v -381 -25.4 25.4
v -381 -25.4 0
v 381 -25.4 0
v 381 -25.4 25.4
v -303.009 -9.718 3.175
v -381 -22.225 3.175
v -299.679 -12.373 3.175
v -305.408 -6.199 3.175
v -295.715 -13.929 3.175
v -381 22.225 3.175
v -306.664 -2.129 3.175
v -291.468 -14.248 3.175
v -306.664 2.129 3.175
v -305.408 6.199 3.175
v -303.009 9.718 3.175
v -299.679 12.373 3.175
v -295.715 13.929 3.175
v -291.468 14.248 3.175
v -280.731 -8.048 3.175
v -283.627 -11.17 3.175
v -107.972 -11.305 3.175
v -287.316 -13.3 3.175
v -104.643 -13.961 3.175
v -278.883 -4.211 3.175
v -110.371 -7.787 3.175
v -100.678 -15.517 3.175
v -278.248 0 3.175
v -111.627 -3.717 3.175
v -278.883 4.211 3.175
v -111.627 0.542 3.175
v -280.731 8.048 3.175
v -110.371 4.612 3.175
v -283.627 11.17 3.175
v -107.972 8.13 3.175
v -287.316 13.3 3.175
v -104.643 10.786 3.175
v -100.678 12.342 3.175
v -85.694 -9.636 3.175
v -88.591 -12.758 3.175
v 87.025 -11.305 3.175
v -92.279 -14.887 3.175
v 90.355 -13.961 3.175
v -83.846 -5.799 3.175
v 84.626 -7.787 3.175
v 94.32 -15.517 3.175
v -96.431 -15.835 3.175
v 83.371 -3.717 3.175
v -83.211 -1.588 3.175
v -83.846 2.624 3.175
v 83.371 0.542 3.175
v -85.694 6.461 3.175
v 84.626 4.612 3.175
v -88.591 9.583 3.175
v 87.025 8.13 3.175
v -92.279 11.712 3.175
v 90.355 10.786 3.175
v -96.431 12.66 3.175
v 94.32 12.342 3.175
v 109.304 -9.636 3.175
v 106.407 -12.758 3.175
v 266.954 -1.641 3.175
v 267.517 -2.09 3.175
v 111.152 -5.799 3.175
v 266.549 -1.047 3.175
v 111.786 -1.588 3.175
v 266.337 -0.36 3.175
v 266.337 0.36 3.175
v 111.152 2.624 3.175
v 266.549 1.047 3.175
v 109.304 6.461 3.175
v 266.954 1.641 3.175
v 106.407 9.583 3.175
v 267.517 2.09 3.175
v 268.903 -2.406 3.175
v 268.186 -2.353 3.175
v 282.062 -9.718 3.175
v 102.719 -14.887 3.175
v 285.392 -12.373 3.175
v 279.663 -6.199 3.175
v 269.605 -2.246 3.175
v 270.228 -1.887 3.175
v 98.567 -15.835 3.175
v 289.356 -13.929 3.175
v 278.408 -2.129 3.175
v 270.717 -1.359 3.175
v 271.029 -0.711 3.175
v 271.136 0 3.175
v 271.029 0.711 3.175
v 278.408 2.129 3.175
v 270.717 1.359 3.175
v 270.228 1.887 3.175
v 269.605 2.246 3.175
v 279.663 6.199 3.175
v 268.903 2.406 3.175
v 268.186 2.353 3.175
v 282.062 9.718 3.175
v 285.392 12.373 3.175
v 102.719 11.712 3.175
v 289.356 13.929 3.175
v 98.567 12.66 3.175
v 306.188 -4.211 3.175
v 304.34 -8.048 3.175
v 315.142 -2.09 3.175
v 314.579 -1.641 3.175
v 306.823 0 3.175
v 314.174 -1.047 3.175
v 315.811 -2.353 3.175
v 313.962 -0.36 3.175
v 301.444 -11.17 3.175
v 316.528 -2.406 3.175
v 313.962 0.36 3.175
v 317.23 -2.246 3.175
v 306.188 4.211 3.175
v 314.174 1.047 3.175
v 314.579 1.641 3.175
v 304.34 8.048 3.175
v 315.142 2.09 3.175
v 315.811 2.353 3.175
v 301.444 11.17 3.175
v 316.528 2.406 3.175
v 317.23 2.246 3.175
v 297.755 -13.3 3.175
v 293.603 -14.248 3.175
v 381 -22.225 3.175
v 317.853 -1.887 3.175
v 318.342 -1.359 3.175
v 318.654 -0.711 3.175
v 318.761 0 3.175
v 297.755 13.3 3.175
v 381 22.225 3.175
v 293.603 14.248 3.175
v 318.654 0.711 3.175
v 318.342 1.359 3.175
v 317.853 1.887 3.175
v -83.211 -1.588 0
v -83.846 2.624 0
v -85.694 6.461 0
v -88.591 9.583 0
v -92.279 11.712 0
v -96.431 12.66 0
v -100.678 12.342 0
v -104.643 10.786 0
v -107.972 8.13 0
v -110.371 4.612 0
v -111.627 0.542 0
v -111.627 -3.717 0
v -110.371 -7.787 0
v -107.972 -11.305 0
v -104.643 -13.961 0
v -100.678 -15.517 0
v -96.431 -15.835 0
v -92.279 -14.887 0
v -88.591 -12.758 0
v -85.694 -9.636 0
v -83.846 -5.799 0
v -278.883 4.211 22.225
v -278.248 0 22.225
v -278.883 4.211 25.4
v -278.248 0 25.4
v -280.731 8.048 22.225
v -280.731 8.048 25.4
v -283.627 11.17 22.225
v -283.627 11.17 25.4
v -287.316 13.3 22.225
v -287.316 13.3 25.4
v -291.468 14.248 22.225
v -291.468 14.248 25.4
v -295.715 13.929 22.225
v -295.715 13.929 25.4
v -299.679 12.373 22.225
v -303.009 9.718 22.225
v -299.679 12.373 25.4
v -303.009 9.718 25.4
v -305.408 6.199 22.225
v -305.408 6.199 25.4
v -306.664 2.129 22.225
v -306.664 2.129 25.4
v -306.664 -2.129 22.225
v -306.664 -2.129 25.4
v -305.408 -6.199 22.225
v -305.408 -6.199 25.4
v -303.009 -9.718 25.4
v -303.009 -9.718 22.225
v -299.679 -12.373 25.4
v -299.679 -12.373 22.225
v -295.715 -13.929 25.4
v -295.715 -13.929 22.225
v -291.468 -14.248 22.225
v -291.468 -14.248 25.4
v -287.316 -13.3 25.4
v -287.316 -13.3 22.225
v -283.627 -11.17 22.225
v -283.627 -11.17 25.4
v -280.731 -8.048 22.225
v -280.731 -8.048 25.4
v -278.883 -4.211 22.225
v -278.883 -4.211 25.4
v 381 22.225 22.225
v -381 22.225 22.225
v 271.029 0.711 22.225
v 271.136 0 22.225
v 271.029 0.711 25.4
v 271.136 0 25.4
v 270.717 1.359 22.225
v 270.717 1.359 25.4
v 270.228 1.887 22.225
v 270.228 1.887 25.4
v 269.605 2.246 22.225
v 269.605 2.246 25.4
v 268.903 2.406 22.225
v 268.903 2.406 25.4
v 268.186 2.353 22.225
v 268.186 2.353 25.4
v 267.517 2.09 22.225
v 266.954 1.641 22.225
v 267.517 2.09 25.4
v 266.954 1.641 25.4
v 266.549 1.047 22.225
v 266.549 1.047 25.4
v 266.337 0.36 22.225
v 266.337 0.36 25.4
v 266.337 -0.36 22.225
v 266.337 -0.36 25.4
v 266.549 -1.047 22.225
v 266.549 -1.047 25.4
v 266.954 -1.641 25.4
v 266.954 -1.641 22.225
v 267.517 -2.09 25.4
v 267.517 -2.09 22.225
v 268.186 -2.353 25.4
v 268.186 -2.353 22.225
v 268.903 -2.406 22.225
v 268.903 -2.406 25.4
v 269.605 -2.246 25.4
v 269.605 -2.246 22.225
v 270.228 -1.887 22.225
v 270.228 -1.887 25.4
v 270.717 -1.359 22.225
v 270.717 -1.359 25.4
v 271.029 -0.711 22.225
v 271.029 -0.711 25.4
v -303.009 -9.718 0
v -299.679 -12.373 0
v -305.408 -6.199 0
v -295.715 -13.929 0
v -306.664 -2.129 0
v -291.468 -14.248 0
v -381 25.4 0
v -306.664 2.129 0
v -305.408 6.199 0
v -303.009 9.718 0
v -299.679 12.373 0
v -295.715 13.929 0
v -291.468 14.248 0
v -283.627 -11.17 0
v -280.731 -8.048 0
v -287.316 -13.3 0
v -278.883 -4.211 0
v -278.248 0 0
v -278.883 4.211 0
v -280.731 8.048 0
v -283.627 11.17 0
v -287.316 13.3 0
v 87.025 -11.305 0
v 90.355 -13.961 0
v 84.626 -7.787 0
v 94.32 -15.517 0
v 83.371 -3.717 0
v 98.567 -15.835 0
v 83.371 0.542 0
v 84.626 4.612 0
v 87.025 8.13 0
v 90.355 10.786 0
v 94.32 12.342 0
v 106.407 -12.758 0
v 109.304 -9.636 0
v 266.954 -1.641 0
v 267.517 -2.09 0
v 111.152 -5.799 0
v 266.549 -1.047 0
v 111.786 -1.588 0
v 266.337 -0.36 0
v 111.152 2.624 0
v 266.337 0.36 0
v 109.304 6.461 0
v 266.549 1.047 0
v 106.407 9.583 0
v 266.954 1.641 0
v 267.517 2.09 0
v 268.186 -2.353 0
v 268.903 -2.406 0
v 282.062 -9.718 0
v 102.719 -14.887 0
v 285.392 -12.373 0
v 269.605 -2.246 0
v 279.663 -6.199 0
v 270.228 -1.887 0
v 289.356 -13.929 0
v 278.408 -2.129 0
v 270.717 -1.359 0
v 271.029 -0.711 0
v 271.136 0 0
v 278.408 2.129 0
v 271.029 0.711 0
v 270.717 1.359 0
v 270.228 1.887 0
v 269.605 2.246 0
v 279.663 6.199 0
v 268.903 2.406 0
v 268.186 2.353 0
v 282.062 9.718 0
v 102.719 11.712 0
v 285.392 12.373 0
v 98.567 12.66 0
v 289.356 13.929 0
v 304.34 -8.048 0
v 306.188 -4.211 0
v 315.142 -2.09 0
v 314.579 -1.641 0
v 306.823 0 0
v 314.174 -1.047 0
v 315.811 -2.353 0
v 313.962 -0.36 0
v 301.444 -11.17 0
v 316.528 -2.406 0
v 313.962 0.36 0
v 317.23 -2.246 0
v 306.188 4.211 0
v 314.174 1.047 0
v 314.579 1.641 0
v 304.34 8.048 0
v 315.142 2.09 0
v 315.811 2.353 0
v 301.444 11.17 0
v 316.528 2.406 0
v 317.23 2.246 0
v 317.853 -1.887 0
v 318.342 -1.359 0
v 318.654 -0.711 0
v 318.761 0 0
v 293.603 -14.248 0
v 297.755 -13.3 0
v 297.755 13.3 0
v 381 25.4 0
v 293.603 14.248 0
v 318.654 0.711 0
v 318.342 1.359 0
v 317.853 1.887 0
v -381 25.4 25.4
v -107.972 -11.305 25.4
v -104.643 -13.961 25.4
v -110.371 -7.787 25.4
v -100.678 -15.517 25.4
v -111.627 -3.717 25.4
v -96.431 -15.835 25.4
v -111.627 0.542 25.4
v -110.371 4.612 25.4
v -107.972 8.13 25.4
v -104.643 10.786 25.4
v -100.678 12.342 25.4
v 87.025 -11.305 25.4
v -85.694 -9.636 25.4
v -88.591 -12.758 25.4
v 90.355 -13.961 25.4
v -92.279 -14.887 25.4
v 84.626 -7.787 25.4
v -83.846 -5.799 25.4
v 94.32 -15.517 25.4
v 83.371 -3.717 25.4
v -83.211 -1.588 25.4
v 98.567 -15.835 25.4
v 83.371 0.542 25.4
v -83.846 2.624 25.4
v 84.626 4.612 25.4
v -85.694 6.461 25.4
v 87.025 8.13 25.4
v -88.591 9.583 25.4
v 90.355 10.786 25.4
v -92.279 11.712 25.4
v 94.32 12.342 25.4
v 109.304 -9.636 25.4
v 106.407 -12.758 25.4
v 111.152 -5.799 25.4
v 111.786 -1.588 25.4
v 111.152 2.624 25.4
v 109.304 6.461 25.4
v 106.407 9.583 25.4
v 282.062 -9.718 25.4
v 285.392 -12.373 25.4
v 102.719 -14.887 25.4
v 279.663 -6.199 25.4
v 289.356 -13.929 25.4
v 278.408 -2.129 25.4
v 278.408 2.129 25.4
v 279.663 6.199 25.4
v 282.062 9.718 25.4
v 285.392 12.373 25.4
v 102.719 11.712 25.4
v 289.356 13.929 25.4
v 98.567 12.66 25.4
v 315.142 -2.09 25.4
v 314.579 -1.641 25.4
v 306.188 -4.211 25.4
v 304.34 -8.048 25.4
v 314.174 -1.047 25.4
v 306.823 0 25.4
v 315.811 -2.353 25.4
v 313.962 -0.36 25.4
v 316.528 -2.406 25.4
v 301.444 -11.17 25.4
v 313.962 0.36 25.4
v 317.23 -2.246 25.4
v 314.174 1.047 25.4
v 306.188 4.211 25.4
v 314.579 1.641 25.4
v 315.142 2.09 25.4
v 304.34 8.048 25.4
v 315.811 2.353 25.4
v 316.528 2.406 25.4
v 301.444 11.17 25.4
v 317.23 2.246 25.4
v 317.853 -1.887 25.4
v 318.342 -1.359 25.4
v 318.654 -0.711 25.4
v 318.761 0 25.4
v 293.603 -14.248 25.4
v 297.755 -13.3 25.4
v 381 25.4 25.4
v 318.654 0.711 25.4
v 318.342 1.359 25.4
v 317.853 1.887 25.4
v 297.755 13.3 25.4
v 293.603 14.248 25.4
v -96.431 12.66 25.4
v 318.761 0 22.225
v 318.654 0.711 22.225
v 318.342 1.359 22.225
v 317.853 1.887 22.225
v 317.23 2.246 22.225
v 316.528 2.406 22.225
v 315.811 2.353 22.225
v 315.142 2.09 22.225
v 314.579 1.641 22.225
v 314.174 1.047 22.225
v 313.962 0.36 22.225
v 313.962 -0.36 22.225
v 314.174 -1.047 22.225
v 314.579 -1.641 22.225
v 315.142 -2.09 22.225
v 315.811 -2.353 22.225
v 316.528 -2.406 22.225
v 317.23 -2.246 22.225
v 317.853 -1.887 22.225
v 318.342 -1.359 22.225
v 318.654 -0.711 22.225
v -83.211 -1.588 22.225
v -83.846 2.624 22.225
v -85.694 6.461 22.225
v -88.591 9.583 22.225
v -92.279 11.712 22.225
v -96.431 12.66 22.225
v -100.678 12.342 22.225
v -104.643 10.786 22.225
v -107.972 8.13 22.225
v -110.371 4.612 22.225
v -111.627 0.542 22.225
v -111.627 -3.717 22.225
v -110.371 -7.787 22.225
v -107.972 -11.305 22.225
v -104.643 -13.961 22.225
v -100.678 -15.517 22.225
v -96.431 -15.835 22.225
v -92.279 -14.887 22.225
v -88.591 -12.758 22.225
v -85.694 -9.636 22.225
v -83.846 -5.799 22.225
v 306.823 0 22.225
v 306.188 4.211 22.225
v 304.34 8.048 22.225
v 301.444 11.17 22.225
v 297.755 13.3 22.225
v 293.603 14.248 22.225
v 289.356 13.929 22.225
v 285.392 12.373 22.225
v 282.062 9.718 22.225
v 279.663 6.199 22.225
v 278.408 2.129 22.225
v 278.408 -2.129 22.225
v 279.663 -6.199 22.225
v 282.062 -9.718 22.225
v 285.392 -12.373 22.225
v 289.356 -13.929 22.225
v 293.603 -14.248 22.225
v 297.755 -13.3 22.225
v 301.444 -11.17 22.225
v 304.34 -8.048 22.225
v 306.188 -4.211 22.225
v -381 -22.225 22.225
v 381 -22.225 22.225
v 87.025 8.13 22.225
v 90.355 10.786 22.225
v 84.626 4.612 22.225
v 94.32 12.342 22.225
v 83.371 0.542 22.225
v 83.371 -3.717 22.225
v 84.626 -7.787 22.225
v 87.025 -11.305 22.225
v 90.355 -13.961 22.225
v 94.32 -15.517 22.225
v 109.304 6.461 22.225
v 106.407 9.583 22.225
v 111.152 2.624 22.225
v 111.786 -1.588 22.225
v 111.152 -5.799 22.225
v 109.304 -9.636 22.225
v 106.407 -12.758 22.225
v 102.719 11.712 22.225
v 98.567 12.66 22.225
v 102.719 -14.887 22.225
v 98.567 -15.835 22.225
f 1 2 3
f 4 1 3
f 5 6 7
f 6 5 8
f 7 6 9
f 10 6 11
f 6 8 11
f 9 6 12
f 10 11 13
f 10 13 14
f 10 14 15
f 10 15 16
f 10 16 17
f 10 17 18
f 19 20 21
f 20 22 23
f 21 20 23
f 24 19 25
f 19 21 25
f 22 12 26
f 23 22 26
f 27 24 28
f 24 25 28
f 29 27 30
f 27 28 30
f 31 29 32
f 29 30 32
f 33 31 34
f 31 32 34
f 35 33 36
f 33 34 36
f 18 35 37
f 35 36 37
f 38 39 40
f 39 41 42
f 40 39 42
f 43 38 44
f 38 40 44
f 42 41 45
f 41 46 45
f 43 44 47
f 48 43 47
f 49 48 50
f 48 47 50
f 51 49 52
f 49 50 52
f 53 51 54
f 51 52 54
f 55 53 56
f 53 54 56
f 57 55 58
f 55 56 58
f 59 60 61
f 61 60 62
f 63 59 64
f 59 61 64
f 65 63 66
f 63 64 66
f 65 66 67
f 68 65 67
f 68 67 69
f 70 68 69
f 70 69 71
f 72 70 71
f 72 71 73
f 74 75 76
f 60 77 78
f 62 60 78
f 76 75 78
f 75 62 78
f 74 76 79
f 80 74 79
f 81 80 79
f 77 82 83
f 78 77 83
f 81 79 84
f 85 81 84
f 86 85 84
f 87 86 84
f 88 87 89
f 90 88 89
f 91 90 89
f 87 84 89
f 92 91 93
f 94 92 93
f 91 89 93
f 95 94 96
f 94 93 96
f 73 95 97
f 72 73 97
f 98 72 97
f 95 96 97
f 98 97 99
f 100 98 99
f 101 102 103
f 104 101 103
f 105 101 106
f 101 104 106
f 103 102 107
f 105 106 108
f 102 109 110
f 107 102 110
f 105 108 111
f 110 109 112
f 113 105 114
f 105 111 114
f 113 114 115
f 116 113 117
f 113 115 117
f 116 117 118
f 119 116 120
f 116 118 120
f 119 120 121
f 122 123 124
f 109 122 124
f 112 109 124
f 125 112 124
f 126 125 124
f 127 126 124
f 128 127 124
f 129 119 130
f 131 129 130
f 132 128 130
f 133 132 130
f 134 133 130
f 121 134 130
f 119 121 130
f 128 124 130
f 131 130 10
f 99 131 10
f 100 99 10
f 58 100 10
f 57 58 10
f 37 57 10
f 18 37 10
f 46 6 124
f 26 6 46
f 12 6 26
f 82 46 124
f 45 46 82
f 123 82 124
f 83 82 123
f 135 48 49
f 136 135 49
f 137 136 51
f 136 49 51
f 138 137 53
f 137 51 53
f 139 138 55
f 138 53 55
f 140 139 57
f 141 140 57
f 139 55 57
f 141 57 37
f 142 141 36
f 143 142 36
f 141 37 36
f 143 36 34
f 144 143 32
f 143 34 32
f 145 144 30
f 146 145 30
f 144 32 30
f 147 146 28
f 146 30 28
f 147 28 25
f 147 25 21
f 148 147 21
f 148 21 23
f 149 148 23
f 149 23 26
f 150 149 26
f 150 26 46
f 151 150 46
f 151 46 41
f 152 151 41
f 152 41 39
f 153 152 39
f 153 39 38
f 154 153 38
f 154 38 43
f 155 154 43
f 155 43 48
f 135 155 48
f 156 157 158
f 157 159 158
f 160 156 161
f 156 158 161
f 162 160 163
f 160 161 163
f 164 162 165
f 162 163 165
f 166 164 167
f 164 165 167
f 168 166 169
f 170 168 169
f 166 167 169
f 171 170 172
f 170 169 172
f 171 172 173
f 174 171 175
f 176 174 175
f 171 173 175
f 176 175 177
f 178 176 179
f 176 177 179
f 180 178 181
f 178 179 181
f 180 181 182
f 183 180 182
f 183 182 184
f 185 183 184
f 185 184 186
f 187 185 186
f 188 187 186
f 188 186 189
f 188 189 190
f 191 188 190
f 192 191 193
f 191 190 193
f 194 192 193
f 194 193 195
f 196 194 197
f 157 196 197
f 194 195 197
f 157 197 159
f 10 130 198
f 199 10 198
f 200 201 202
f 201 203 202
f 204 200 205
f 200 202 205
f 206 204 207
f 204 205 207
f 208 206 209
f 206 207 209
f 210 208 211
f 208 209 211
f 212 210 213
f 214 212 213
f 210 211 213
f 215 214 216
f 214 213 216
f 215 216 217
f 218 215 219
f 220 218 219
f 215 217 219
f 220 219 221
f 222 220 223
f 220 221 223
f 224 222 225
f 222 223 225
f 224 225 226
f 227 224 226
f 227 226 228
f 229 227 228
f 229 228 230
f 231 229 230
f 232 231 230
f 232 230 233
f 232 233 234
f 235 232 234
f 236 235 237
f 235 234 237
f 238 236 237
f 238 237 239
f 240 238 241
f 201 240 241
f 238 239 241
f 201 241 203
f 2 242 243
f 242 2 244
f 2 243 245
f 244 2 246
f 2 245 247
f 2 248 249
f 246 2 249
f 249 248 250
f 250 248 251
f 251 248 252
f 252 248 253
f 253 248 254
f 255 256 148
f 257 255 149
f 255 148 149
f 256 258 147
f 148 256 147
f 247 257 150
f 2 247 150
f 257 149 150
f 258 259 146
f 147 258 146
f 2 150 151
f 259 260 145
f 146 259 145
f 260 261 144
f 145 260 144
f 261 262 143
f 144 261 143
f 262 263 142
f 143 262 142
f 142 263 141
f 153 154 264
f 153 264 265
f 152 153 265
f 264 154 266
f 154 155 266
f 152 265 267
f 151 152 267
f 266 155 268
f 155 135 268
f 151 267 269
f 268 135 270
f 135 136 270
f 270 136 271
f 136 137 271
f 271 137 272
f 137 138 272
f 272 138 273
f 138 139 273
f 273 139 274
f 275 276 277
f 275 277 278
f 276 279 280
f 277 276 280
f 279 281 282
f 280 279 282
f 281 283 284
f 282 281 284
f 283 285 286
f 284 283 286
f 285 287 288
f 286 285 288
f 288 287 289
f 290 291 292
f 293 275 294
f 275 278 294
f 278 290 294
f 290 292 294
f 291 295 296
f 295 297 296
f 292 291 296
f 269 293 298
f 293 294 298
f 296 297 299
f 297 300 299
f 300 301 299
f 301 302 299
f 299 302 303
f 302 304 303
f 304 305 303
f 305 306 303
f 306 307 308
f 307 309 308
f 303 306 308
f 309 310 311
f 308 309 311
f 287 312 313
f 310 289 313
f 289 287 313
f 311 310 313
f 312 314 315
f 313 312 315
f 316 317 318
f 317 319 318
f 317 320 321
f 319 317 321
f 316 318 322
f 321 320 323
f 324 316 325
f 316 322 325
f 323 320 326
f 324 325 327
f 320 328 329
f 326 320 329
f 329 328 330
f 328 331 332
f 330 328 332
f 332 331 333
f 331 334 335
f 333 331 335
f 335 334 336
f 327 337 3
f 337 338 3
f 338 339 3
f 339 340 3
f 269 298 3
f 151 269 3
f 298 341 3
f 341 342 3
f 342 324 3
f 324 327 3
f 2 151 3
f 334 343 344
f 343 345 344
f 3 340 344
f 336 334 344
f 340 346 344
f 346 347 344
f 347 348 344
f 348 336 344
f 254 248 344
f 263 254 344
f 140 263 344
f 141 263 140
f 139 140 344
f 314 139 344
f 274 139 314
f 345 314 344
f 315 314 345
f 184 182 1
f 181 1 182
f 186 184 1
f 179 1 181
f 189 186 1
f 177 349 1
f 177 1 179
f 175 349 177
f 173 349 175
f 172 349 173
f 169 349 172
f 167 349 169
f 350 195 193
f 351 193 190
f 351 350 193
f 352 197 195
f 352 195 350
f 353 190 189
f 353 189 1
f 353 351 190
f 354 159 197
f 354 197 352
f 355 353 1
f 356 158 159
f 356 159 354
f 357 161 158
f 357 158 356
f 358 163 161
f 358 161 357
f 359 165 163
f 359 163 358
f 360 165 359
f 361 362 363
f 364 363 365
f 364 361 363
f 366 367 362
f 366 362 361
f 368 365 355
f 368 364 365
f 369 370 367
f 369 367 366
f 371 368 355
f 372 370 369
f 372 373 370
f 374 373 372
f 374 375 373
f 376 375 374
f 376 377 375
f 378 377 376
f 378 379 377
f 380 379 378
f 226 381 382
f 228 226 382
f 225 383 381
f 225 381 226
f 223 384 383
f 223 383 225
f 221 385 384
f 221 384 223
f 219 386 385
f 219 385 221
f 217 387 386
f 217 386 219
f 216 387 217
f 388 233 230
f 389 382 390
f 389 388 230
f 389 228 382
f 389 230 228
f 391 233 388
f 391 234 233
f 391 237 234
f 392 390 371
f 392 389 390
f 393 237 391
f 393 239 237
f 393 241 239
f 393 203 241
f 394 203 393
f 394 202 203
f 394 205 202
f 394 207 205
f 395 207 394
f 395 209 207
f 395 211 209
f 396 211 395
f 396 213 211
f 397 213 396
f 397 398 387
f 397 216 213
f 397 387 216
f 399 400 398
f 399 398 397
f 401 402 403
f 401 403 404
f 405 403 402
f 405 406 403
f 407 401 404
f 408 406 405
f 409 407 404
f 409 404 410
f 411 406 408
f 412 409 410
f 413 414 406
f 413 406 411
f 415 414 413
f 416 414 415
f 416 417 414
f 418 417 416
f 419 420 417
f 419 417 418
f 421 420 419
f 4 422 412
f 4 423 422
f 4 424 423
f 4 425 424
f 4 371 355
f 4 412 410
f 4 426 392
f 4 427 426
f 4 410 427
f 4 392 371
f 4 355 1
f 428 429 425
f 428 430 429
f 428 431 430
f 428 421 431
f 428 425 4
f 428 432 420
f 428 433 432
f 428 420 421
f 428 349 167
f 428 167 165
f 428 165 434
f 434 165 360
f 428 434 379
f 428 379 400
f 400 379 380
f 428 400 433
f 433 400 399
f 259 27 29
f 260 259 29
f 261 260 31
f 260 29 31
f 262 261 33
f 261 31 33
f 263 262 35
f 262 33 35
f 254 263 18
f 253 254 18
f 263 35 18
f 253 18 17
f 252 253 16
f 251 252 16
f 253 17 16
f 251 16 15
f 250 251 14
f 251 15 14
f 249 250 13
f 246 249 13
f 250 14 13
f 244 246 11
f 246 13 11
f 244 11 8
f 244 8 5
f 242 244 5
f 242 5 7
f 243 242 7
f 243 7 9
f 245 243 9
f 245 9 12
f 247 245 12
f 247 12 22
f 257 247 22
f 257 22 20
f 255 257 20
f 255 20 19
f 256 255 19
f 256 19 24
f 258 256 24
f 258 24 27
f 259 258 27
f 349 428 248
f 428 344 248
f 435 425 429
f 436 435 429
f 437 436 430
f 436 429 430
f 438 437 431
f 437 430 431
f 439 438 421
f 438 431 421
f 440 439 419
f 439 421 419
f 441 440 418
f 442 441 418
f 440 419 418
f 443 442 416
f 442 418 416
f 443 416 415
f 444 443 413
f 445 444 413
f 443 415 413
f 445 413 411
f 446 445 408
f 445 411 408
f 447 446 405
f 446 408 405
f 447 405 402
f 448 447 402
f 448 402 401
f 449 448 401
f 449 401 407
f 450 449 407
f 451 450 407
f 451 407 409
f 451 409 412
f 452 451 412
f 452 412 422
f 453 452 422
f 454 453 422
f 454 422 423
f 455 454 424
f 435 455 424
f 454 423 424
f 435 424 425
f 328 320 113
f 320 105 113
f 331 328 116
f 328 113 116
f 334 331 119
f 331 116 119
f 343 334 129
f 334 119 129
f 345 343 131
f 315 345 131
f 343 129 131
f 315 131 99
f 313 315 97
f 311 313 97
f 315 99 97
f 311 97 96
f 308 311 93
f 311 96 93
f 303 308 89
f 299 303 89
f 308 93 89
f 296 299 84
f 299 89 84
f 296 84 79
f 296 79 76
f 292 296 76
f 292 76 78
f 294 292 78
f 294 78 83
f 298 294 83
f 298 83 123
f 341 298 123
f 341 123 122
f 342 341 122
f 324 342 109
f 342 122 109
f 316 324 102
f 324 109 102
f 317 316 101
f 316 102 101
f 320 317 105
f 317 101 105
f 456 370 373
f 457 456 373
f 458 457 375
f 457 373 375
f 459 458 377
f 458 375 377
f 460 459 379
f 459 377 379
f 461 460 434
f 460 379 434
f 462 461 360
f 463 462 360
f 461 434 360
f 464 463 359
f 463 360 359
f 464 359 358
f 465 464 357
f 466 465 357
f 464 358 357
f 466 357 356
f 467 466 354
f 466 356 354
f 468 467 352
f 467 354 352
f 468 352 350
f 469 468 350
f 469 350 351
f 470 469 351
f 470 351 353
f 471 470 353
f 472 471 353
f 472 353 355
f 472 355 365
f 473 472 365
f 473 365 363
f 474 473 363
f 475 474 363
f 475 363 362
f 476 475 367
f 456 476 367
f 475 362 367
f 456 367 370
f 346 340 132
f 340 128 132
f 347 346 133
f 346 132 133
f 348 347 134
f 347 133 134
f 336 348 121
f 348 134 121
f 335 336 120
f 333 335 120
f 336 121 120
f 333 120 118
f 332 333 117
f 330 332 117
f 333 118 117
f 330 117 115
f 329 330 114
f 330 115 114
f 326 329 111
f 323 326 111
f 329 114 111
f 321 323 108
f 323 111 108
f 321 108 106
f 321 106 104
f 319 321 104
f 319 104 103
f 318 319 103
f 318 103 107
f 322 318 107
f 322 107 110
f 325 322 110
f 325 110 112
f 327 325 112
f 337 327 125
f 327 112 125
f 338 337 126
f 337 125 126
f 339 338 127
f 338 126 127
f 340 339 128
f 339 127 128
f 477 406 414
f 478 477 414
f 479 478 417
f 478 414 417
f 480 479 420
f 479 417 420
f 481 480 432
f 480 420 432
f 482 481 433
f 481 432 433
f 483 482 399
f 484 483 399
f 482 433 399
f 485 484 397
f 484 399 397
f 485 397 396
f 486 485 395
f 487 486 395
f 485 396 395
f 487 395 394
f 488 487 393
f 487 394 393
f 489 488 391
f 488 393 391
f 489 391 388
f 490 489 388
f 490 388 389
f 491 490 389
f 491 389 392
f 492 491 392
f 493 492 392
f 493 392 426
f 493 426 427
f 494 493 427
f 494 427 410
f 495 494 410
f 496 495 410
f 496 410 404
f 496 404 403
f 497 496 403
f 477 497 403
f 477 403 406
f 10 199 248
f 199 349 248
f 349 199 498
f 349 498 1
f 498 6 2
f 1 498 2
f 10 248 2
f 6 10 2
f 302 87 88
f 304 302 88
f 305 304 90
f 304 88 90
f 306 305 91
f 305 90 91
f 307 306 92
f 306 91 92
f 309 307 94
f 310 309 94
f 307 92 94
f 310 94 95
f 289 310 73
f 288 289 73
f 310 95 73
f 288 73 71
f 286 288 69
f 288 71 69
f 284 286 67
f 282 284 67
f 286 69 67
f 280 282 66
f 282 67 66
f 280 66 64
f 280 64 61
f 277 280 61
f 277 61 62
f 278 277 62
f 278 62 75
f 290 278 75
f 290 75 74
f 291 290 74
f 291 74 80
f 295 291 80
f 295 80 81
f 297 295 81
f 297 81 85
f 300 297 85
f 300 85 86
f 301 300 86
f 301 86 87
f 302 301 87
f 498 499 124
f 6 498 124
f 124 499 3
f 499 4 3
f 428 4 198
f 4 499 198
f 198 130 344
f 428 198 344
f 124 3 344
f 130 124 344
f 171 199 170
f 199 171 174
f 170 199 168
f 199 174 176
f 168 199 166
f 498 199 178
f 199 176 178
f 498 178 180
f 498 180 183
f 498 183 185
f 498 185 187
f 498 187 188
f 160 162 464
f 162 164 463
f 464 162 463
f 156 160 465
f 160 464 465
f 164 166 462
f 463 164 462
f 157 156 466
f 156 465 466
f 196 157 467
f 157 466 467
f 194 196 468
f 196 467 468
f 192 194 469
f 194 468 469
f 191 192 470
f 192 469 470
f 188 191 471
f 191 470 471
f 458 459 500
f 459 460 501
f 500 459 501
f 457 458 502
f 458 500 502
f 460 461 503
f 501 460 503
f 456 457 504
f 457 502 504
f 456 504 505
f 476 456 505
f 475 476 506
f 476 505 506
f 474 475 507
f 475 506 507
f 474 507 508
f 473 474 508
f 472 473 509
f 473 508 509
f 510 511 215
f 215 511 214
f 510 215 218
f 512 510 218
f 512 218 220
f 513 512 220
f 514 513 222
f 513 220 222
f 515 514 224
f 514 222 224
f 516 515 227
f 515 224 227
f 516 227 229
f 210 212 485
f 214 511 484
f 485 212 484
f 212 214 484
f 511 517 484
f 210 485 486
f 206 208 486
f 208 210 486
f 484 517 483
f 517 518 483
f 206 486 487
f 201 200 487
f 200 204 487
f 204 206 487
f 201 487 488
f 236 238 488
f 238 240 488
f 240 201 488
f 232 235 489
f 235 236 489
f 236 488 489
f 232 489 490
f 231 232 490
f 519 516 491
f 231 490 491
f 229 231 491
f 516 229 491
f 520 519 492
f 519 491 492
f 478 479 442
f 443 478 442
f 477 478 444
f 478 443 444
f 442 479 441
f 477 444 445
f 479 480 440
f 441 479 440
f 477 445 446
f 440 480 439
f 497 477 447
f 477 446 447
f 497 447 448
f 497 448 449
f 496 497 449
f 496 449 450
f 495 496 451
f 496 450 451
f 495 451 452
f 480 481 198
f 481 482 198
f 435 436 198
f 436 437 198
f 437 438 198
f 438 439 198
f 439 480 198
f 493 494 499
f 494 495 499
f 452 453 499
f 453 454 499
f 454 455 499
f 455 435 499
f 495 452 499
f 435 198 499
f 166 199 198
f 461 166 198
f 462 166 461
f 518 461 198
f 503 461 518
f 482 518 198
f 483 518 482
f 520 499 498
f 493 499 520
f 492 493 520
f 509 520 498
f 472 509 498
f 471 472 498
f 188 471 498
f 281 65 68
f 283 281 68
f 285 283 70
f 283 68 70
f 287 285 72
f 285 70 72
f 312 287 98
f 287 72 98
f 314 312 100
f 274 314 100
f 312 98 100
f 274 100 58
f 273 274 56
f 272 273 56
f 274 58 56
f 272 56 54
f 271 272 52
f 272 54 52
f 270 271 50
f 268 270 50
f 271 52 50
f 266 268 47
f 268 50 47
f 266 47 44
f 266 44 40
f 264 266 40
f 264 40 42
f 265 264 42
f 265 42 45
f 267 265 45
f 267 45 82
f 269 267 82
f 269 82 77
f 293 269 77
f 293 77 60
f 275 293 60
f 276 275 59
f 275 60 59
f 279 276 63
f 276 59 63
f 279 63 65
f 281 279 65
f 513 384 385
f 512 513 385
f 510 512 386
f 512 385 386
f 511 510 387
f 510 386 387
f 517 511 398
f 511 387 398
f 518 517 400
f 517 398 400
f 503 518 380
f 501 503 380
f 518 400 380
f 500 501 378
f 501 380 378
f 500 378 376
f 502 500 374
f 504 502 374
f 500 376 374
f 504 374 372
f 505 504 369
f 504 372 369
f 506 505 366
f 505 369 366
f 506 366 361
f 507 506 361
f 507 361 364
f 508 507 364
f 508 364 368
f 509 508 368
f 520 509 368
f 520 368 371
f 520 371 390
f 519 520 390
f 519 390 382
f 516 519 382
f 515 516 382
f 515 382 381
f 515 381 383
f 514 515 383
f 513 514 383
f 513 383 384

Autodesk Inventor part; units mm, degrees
ref_plane "YZ Plane" through (0, 0, 0) normal (1, 0, 0) x (0, 1, 0)
ref_plane "XZ Plane" through (0, 0, 0) normal (0, 1, 0) x (-1, 0, 0)
ref_plane "XY Plane" through (0, 0, 0) normal (0, 0, 1) x (1, 0, 0)
sketch "Sketch1" plane through (0, 0, 0) normal (0, 0, 1) x (1, 0, 0)
  line L0 (-381, -25.4) -> (381, -25.4)
  line L1 (381, -25.4) -> (381, 25.4)
  line L2 (381, 25.4) -> (-381, 25.4)
  line L3 (-381, 25.4) -> (-381, -25.4)
  line L4 (-381, -25.4) -> (381, 25.4) construction
  line L5 (381, -25.4) -> (-381, 25.4) construction
  point P0 (0, 0)
  dimension "d0" = 762
  dimension "d1" = 50.8
extrude "Extrusion1" add sketch "Sketch1" along normal blind 25.4
sketch "Sketch2" plane through (381, -25.4, 0) normal (1, 0, 0) x (0, 0, -1)
  line L0 (-25.4, 0) -> (-25.4, 50.8) projected
  line L1 (-25.4, 50.8) -> (0, 50.8)
  line L2 (0, 50.8) -> (0, 0)
  line L3 (0, 0) -> (-25.4, 0)
  line L4 (-25.4, 0) -> (-25.4, 50.8)
  line L5 (-3.175, 47.625) -> (-22.225, 47.625)
  line L6 (-22.225, 47.625) -> (-22.225, 3.175)
  line L7 (-22.225, 3.175) -> (-3.175, 3.175)
  line L8 (-3.175, 3.175) -> (-3.175, 47.625)
  point P0 (0, 25.4)
  dimension "d4" = 3.175
extrude "Extrusion2" cut sketch "Sketch2" against normal blind 762 contours L8 L7 L6 L5
sketch "Sketch3" plane through (0, 0, 25.4) normal (0, 0, 1) x (1, 0, 0)
  circle A0 centre (-292.5356, 0) radius 14.2875
  circle A1 centre (292.5356, 0) radius 14.2875
  line L0 (381, 25.4) -> (-381, 25.4) projected
  line L1 (0, 25.4) -> (0, -25.4)
  line L2 (-381, -25.4) -> (381, -25.4) projected
  dimension "d40" = 292.5356
  dimension "d41" = 292.5356
extrude "Extrusion3" cut sketch "Sketch3" against normal blind 25.4
sketch "Sketch5" plane through (0, 0, 25.4) normal (0, 0, 1) x (1, 0, 0)
  point P0 (0, 0)
sketch "Sketch6" plane through (0, 0, 25.4) normal (0, 0, 1) x (1, 0, 0)
  circle A0 centre (97.4989, -1.5875) radius 14.2875
  circle A1 centre (-97.4989, -1.5875) radius 14.2875
  line L0 (381, 25.4) -> (-381, 25.4) projected
  point P0 (0, 0)
  dimension "d28" = 97.5119
  dimension "d29" = 97.5119
  dimension "d30" = 28.575
  dimension "d31" = 28.575
  dimension "d34" = 26.9875
  dimension "d35" = 26.9875
extrude "Extrusion5" cut sketch "Sketch6" against normal blind 25.4
sketch "Sketch8" plane through (0, 0, 25.4) normal (0, 0, 1) x (1, 0, 0)
  circle A0 centre (268.7231, 0) radius 2.413
  circle A1 centre (316.3481, 0) radius 2.413
  circle A2 centre (292.5356, 0) radius 14.2875 projected
  point P0 (0, 0)
  dimension "d42" = 47.625
  dimension "d43" = 23.8125
  dimension "d44" = 4.826
  dimension "d45" = 4.826
extrude "Extrusion7" cut sketch "Sketch8" against normal blind 25.4 contours A0 | A1
properties part number "30inchbarchassis" material "Aluminum 6061"
